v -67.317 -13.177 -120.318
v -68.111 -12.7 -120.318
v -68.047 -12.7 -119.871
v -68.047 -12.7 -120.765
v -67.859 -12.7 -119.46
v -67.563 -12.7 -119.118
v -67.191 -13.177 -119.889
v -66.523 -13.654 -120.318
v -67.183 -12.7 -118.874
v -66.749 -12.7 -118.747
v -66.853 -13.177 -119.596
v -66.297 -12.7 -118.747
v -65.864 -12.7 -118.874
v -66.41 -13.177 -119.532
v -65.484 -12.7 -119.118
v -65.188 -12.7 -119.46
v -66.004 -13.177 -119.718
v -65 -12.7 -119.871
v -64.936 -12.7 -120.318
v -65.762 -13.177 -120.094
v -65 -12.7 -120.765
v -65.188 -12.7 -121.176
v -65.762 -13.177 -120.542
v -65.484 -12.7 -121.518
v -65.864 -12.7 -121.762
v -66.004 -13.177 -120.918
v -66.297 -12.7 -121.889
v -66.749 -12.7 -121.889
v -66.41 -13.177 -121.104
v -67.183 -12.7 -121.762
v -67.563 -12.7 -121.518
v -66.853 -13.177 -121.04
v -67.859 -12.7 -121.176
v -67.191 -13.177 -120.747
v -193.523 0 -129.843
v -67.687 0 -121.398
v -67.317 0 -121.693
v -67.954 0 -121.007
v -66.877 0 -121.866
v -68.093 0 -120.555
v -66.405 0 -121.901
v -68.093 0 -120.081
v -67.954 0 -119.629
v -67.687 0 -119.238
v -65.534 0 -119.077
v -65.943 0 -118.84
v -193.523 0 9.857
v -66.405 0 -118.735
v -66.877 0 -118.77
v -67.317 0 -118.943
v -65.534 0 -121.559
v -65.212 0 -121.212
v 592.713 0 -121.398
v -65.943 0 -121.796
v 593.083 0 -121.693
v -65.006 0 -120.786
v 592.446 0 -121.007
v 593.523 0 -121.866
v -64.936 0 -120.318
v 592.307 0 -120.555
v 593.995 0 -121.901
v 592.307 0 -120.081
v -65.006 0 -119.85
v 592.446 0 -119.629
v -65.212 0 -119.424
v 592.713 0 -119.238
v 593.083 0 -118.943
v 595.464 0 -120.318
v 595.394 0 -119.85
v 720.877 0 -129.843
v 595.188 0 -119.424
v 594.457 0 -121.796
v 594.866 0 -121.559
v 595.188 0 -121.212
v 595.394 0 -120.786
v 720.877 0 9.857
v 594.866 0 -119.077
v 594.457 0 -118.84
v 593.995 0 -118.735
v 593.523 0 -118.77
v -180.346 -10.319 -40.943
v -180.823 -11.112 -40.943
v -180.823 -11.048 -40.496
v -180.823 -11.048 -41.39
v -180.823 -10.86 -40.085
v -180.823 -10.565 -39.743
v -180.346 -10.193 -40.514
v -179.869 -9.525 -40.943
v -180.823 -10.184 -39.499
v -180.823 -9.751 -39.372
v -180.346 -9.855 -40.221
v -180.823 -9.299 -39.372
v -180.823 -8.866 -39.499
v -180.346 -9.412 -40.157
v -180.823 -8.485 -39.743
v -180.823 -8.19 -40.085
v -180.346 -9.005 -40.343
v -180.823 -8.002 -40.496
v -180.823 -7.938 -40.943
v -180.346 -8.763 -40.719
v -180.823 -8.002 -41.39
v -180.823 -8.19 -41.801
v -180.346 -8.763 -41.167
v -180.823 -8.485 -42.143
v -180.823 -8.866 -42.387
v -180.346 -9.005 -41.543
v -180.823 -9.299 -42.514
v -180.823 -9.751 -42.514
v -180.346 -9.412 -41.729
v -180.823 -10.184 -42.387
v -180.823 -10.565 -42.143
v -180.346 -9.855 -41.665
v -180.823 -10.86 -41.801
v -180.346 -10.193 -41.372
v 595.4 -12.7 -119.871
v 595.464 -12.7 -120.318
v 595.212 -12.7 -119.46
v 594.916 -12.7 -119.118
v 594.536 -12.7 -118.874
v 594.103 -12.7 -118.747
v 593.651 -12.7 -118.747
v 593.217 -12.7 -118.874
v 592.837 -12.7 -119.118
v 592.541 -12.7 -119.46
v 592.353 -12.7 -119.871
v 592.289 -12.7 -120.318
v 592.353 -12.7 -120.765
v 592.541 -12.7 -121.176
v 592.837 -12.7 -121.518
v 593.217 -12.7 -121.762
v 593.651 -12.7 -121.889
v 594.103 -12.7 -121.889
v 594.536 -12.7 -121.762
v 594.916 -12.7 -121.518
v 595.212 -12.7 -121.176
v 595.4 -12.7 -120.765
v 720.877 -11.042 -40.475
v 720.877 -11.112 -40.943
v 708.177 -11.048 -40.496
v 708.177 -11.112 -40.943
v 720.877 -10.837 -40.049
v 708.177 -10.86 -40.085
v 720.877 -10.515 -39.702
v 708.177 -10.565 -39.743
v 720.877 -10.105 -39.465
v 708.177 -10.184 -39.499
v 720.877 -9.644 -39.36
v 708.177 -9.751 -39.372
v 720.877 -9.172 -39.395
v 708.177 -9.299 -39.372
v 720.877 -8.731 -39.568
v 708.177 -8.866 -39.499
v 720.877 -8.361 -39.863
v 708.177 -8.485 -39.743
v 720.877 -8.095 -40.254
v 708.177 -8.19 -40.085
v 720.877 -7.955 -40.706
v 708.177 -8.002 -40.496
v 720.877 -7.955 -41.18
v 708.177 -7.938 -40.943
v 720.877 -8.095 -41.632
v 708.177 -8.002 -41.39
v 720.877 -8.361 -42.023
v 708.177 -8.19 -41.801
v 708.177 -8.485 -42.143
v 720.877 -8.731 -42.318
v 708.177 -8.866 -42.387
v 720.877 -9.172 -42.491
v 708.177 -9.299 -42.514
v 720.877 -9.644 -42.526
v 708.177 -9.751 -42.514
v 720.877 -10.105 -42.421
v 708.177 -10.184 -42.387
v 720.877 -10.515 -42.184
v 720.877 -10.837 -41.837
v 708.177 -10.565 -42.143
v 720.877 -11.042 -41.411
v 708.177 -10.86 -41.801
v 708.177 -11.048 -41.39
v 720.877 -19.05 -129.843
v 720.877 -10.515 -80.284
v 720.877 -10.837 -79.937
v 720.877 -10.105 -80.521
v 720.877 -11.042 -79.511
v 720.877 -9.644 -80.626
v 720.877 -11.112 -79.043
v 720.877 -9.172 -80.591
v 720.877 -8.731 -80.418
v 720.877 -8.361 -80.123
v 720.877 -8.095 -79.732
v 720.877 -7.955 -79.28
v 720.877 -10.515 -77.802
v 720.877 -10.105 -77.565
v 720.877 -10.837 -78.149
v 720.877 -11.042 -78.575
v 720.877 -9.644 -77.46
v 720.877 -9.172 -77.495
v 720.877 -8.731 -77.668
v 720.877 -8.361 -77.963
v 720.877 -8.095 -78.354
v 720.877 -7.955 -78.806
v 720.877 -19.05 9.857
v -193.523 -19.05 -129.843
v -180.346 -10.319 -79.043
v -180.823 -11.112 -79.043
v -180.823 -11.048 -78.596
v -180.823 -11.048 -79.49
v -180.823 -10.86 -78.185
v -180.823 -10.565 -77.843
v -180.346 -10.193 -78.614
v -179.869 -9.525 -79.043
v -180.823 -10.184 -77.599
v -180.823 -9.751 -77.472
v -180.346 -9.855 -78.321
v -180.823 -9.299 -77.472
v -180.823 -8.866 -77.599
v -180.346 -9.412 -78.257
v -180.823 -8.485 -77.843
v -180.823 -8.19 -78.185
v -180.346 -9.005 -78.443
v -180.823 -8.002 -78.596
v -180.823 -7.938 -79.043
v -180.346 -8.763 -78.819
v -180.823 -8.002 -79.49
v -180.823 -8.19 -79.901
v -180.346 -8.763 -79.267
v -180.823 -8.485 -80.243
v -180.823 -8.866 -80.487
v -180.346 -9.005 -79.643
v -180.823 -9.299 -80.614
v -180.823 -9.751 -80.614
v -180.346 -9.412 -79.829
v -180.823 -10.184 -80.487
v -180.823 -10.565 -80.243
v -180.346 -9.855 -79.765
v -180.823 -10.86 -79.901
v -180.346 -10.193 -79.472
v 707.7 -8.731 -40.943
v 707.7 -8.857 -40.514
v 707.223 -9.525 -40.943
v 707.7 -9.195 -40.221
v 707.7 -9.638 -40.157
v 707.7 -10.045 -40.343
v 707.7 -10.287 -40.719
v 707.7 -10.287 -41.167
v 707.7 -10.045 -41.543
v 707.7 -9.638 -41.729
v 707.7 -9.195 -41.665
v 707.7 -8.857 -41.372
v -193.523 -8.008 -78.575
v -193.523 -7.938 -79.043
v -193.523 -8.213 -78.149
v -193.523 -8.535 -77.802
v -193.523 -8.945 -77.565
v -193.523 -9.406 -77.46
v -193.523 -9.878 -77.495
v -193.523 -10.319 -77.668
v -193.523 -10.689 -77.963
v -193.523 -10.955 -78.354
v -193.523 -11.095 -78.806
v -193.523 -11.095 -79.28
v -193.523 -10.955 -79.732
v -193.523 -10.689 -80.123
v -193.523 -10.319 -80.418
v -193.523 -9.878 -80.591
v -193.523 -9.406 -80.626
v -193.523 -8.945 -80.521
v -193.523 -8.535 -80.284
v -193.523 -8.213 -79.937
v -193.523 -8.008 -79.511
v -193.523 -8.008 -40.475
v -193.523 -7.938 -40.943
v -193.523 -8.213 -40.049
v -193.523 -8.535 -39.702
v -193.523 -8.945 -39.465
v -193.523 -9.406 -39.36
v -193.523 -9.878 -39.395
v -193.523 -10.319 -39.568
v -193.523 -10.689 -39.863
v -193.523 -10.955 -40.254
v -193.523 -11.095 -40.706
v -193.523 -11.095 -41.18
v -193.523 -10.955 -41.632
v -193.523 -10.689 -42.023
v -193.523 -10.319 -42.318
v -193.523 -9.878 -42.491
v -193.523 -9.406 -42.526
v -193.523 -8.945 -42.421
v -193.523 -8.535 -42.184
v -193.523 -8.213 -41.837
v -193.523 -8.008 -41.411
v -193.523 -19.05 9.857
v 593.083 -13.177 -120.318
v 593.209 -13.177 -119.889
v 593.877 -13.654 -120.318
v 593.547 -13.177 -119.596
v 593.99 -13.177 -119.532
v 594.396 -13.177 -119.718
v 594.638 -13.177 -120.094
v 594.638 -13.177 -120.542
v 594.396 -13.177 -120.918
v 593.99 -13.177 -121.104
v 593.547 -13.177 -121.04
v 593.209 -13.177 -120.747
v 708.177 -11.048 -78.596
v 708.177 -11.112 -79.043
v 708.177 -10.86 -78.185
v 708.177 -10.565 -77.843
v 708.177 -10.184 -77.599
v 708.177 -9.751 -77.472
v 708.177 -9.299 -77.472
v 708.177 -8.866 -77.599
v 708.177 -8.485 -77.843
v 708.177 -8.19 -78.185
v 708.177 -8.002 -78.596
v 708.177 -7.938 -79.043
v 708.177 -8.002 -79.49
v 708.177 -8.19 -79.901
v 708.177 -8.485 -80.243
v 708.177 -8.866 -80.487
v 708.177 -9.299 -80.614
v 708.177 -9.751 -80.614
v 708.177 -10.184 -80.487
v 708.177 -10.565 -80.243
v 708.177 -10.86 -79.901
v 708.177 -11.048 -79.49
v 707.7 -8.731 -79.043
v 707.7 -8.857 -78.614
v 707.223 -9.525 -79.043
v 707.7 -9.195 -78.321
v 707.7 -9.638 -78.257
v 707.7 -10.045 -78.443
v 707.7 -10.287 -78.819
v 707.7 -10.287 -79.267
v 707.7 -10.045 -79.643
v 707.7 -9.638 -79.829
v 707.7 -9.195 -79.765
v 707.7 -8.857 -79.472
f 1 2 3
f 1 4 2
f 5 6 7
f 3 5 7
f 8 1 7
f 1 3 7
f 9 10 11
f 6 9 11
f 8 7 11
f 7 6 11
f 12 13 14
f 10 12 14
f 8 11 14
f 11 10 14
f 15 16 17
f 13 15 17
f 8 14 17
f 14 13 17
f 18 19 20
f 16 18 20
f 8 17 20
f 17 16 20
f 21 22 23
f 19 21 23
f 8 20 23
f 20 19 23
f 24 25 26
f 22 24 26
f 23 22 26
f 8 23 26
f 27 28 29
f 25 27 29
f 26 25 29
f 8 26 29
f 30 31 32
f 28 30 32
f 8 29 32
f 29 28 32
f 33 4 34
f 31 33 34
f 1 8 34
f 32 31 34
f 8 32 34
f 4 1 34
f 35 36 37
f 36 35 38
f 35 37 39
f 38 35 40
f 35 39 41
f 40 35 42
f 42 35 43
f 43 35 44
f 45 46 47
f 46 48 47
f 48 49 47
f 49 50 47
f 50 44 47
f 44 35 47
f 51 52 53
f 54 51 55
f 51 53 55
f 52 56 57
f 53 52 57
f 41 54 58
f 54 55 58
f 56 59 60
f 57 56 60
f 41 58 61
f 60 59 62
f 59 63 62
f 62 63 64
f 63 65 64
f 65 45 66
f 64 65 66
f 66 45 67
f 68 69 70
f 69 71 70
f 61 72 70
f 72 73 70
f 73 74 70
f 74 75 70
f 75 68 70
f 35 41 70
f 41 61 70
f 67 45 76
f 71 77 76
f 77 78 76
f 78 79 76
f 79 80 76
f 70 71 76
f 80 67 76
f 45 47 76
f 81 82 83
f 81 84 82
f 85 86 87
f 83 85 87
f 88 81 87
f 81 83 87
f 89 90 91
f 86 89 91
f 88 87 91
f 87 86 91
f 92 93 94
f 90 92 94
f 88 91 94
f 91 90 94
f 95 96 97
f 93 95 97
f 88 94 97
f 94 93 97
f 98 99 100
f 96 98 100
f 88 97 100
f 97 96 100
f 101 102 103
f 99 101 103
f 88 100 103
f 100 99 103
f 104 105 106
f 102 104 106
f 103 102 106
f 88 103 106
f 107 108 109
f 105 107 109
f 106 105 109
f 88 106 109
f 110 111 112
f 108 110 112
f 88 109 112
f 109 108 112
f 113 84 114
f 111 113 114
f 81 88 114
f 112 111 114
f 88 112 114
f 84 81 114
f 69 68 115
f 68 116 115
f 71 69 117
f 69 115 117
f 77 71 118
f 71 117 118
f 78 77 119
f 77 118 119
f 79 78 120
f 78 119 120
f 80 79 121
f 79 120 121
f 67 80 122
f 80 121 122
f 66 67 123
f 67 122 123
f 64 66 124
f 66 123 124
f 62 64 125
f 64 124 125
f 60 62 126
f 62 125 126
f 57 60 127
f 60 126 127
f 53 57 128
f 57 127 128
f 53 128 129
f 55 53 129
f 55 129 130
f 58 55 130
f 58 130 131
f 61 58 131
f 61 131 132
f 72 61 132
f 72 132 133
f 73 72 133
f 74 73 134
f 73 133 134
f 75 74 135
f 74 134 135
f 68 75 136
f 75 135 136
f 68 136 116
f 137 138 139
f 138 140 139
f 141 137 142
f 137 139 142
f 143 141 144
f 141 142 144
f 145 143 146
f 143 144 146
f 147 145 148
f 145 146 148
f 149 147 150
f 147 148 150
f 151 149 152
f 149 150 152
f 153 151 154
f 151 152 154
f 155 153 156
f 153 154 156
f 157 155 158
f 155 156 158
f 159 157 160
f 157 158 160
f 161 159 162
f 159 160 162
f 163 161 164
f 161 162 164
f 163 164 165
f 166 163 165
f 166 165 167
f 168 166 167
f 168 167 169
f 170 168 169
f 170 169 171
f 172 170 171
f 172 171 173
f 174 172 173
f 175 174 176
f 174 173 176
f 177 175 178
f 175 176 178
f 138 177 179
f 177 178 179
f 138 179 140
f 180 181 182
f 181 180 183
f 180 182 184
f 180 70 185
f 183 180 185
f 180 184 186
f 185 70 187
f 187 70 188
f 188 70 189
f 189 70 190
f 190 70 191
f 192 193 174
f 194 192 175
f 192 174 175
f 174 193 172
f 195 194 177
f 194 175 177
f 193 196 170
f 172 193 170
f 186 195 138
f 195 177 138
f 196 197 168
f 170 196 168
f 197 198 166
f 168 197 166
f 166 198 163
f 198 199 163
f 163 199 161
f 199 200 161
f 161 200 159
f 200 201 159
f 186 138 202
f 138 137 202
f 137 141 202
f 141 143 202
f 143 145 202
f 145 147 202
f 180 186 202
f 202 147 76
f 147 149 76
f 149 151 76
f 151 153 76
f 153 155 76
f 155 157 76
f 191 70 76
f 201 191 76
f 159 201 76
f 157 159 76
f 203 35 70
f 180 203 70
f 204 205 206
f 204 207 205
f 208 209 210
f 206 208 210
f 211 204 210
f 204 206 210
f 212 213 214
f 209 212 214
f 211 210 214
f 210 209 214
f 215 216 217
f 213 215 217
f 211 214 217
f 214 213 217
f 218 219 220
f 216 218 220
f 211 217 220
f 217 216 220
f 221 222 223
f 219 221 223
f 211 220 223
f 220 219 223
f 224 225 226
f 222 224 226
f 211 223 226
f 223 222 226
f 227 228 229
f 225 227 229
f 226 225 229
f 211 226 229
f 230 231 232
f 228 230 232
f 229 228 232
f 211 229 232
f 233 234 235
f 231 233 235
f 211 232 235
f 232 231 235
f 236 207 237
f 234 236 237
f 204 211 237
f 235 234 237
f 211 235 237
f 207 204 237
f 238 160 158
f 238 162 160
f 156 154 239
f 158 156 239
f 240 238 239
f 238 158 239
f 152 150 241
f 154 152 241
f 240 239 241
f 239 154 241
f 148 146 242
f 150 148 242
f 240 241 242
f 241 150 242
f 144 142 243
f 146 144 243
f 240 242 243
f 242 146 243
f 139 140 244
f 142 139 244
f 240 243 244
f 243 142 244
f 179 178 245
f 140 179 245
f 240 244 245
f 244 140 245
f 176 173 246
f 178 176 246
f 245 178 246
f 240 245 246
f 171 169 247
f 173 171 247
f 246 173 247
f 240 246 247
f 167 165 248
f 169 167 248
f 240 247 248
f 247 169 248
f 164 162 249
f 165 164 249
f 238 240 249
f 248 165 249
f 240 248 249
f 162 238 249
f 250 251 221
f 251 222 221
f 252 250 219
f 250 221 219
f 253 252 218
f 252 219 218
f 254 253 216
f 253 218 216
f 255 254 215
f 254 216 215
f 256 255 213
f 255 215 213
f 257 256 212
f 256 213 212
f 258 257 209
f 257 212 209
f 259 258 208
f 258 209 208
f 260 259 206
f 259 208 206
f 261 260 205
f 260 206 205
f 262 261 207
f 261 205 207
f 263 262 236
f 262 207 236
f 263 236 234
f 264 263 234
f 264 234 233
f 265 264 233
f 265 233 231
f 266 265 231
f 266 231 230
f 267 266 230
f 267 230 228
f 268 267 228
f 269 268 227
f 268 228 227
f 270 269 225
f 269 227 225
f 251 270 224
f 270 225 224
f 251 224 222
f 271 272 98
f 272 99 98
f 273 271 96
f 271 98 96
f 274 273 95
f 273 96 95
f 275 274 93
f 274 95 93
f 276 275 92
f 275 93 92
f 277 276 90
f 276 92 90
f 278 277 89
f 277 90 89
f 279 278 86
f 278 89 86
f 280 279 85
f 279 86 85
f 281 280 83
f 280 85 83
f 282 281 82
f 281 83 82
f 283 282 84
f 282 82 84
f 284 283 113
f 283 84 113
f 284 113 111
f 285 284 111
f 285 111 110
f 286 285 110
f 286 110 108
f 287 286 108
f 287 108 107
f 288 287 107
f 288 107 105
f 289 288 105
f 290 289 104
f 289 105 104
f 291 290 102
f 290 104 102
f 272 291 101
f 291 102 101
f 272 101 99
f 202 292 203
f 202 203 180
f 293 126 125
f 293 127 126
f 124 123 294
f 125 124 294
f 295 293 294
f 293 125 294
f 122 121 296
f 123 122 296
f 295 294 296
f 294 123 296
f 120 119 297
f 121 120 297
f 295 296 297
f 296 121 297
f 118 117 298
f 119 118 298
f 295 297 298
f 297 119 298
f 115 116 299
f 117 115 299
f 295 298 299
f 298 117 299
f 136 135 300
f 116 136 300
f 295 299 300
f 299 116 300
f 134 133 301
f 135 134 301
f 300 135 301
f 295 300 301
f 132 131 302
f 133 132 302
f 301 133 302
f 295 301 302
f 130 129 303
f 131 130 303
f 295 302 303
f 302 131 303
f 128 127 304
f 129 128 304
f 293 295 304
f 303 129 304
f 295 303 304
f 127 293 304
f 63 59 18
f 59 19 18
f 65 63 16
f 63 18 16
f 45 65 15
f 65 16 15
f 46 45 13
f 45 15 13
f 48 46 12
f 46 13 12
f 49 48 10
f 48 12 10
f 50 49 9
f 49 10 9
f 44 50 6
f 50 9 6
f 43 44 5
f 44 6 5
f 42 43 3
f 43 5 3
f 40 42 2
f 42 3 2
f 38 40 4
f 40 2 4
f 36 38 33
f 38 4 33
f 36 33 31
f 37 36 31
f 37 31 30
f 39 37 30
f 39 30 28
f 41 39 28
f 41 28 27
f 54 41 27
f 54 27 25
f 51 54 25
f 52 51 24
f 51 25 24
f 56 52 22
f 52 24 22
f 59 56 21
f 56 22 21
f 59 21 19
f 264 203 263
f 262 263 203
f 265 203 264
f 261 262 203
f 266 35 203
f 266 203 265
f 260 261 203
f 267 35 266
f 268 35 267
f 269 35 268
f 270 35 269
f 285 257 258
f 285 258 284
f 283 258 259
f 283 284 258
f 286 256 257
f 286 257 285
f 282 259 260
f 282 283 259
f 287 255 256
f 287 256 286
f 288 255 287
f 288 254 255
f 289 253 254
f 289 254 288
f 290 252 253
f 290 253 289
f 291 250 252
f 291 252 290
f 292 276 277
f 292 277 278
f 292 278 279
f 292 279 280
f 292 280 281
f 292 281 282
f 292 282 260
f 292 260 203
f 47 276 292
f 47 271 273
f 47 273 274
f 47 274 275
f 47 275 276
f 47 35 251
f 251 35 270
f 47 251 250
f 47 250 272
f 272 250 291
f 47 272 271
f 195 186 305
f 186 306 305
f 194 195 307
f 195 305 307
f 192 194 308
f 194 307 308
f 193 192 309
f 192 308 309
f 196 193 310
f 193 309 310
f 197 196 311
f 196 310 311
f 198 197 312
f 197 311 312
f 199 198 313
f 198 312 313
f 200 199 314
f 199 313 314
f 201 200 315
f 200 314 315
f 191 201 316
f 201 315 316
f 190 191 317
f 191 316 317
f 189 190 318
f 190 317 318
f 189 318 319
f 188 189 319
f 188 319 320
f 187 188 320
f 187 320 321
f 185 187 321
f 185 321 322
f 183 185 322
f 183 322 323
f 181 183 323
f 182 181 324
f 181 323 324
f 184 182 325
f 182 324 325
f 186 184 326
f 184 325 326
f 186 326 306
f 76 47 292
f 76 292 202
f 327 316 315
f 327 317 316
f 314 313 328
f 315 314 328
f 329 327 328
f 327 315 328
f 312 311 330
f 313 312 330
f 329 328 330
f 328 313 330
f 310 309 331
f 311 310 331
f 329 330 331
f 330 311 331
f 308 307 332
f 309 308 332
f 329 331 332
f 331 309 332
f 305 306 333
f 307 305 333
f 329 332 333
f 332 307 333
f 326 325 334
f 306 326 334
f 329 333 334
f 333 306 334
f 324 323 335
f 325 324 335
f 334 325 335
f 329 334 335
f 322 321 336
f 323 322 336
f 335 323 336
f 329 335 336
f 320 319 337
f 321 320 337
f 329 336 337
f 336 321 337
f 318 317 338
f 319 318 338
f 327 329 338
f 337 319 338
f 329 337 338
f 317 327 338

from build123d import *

# Parameters (mm, degrees)
F0_W     = 914.4
F0_H     = 139.7
F1_DEPTH = 19.05
F3_D     = 3.175
F3_DEPTH = 12.7
F3_TIP   = 0.9538662327
F5_D     = 3.175
F5_DEPTH = 12.7
F5_TIP   = 0.9538662327
F7_D     = 3.175
F7_DEPTH = 12.7
F7_TIP   = 0.9538662327


with BuildPart() as f1:
    # F0 (on Front) → F1 (new body)
    with BuildSketch(Plane.XZ):
        with Locations((263.6766368695, -59.9929172248)):
            Rectangle(F0_W, F0_H)
    extrude(amount=F1_DEPTH)

    # F3
    with Locations(Plane.YZ.offset(720.8766368695)):
        with Locations((-9.525, -40.9429172248), (-9.525, -79.0429172248)):
            Hole(F3_D / 2, depth=F3_DEPTH)
            with Locations((0, 0, -(F3_DEPTH + F3_TIP / 2))):  # 118° drill point
                Cone(0, F3_D / 2, F3_TIP, mode=Mode.SUBTRACT)

    # F5
    with Locations(Plane(origin=(-193.5233631305, 0, 0), x_dir=(0, -1, 0), z_dir=(-1, 0, 0))):
        with Locations((9.525, -40.9429172248), (9.525, -79.0429172248)):
            Hole(F5_D / 2, depth=F5_DEPTH)
            with Locations((0, 0, -(F5_DEPTH + F5_TIP / 2))):  # 118° drill point
                Cone(0, F5_D / 2, F5_TIP, mode=Mode.SUBTRACT)

    # F7
    with Locations(Plane(origin=(0, 0, 0), x_dir=(-1, 0, 0), z_dir=(0, 1, 0))):
        with Locations((-593.8766368695, -120.3179172248), (66.5233631305, -120.3179172248)):
            Hole(F7_D / 2, depth=F7_DEPTH)
            with Locations((0, 0, -(F7_DEPTH + F7_TIP / 2))):  # 118° drill point
                Cone(0, F7_D / 2, F7_TIP, mode=Mode.SUBTRACT)


solid = f1.part
